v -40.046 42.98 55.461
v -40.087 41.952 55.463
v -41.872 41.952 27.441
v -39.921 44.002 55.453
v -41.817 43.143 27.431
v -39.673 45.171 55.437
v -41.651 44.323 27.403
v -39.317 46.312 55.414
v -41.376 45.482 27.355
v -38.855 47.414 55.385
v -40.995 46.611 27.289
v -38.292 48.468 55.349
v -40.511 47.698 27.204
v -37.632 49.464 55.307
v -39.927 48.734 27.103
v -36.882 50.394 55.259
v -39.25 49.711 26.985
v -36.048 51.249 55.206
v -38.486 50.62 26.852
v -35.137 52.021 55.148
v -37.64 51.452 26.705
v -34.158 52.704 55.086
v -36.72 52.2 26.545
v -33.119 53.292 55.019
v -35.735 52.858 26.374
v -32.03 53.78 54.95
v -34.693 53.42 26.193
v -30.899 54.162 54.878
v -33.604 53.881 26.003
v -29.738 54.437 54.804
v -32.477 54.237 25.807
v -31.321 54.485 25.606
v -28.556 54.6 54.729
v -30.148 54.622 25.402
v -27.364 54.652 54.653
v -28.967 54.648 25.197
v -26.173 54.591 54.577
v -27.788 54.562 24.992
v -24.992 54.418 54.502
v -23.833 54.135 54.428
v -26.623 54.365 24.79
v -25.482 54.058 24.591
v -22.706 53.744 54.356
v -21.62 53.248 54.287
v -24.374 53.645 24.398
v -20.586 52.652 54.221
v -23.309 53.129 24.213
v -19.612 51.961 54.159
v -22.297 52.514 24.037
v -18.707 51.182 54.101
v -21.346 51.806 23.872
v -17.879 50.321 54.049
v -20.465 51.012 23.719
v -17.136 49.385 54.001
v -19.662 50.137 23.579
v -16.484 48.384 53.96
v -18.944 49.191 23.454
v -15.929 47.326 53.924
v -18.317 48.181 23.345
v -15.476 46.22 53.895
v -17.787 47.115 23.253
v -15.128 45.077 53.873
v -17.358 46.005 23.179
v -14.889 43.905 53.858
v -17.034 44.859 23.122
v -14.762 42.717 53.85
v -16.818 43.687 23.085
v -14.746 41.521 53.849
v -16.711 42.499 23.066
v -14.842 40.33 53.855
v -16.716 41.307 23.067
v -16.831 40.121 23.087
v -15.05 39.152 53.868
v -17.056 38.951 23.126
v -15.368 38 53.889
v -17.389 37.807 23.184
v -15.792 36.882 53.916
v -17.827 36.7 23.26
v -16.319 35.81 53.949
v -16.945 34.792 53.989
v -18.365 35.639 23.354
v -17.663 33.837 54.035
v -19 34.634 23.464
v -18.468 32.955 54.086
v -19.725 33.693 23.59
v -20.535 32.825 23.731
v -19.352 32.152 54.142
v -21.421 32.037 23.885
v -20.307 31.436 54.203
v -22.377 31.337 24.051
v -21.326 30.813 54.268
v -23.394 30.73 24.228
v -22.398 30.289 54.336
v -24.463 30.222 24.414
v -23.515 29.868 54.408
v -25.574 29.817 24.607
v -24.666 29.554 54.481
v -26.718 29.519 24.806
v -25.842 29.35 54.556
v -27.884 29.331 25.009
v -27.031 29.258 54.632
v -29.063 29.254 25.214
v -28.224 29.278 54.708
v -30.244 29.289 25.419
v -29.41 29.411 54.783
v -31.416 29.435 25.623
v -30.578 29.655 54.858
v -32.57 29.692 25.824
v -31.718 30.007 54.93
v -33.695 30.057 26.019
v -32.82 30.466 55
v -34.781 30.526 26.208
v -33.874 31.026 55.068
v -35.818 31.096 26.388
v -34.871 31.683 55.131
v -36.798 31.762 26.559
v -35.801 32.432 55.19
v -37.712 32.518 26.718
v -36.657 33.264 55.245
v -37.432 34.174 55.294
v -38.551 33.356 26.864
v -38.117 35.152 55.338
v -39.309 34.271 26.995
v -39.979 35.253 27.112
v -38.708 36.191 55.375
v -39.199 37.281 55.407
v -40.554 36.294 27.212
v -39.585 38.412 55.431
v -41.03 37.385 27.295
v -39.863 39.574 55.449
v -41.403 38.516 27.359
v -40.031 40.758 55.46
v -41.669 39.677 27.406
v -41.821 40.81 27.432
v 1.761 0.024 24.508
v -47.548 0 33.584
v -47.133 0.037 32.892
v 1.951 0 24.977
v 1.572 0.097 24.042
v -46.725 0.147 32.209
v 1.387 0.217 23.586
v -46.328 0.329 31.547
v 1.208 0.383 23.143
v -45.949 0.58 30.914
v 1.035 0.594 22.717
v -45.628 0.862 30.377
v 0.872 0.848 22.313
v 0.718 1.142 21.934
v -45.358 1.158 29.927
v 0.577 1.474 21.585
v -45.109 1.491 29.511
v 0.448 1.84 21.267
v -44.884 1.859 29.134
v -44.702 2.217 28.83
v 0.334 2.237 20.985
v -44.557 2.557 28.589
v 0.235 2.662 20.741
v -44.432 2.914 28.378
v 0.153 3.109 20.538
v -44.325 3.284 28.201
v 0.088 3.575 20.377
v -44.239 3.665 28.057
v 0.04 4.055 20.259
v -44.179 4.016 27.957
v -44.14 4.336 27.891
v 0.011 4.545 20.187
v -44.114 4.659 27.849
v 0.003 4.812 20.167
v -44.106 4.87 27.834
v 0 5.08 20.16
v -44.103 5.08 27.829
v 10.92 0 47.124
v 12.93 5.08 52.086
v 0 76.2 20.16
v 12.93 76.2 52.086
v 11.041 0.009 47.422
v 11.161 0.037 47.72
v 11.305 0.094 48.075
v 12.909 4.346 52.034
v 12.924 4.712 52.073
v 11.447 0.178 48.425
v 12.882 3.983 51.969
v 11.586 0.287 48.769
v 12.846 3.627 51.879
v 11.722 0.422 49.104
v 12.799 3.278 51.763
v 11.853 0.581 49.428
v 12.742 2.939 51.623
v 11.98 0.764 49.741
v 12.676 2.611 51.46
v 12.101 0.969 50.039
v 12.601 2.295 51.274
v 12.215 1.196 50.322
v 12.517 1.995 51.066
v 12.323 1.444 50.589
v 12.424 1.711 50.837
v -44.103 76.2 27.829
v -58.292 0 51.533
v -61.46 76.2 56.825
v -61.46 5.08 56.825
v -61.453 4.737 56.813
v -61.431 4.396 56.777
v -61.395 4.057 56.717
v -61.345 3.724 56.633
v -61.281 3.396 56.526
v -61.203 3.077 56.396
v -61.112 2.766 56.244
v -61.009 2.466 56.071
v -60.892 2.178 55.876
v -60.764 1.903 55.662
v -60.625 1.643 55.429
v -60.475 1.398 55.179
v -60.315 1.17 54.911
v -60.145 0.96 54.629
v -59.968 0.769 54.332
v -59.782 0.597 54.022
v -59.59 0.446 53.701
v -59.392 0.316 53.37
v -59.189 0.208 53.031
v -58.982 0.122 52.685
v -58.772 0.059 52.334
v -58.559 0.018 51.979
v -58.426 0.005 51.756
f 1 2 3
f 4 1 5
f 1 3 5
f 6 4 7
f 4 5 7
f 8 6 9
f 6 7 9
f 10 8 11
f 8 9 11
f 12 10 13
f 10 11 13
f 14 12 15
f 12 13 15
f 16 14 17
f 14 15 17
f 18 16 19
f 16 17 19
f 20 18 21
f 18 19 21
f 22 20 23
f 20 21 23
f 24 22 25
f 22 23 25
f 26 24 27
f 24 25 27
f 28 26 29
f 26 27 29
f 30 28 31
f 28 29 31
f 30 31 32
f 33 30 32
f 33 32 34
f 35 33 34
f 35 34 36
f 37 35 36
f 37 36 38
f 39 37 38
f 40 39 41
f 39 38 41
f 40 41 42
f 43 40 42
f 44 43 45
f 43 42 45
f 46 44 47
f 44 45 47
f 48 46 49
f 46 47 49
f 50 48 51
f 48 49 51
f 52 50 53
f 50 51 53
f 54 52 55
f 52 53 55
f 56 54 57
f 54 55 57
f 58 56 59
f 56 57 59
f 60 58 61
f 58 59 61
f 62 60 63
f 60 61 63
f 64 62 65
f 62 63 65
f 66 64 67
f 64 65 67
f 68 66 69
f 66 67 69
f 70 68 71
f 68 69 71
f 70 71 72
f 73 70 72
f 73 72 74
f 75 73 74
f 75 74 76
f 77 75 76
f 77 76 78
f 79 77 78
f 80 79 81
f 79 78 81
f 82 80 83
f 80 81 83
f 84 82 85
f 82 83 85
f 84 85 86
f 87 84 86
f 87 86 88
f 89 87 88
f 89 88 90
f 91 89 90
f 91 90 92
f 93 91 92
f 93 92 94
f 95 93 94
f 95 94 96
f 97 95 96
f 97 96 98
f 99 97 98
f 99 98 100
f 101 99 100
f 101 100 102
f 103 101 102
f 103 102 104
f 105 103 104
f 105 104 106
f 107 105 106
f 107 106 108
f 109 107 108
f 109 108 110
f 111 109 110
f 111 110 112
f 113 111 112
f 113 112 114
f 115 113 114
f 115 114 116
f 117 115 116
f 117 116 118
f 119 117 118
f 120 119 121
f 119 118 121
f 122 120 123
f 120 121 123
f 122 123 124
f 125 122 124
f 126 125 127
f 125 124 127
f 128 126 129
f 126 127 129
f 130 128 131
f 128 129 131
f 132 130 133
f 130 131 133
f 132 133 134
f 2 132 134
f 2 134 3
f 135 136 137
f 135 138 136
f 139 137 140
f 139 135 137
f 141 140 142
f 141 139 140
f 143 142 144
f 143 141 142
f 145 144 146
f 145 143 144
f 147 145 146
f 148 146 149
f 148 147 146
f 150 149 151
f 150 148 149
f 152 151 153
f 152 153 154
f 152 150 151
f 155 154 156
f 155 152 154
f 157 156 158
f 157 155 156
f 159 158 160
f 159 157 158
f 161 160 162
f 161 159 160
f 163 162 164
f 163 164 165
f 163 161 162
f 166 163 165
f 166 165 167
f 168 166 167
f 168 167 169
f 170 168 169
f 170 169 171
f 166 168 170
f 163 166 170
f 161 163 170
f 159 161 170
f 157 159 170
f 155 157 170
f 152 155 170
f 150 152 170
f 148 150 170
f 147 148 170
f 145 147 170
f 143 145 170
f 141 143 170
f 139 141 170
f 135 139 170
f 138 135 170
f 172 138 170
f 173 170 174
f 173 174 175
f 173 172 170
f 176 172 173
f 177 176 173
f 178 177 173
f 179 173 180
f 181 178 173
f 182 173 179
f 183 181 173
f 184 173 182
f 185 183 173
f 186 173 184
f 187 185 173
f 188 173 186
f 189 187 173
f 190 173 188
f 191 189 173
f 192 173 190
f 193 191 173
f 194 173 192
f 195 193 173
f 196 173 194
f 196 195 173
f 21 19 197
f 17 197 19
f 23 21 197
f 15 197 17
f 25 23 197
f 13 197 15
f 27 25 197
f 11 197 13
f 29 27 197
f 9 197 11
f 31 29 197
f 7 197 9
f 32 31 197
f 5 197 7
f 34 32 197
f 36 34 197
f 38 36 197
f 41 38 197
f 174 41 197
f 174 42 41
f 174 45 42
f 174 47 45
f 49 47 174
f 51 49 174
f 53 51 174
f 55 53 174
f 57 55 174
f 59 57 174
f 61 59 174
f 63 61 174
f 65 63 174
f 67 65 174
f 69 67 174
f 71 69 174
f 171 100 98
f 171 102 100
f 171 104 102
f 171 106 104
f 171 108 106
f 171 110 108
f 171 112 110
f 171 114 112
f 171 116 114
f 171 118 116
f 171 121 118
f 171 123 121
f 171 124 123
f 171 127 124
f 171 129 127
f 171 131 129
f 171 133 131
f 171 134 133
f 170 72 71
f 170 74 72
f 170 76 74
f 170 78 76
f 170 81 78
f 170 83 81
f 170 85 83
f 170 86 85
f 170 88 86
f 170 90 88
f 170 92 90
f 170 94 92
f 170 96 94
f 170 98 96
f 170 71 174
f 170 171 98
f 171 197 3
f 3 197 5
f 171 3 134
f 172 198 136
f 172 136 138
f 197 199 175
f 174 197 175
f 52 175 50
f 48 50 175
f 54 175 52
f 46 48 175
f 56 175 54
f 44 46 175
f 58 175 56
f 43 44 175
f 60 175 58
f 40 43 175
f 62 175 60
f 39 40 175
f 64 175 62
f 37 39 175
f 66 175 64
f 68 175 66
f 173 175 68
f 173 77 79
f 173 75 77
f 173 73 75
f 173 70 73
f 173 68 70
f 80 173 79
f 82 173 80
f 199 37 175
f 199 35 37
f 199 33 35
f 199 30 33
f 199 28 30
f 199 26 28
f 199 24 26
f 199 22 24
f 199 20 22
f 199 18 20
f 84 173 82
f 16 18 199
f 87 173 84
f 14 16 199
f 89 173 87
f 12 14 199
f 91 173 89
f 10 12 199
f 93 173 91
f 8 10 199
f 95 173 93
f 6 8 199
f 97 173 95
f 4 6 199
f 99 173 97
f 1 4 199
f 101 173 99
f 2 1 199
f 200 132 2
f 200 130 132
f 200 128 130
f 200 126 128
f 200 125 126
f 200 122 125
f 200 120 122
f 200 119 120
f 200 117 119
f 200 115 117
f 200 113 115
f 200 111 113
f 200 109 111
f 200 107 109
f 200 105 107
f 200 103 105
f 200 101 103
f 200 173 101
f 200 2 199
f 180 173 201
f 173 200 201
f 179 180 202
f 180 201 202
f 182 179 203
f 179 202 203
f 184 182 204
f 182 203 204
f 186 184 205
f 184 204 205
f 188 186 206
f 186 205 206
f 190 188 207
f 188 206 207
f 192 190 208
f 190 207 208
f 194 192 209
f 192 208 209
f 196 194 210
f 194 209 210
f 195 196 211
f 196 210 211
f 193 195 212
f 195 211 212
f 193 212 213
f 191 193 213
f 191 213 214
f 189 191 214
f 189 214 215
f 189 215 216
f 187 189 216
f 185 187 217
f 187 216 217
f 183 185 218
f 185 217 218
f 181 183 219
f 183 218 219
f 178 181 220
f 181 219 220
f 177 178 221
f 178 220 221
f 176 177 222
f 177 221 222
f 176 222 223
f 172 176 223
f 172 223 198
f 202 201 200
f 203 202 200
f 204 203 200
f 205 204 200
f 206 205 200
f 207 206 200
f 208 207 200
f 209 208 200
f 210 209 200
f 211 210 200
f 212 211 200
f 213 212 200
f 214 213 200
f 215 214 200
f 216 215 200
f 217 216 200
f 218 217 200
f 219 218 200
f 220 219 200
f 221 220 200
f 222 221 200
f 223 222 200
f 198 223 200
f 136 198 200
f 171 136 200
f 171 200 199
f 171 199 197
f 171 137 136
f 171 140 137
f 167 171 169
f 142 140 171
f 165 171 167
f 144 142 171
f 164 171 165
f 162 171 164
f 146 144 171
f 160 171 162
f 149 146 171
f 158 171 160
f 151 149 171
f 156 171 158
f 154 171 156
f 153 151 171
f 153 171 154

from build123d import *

# Parameters (mm, degrees)
F1_DEPTH = 76.2
F2_R     = 5.08
F3_R     = 5.08
F5_D     = 25.4


with BuildPart() as f1:
    # F0 (on Front) → F1 (new body)
    with BuildSketch(Plane.XZ):
        Polygon((12.929662, 52.085873), (-61.460182, 56.824941), (-44.102553, 27.828874), (0, 20.160461), align=None)
    extrude(amount=-F1_DEPTH)

    # F2
    f2_edges = [f1.edges().sort_by_distance(p)[0] for p in [
        (-24.26526, 0, 54.455407),
    ]]
    fillet(f2_edges, radius=F2_R)

    # F3
    f3_edges = [f1.edges().sort_by_distance(p)[0] for p in [
        (-22.051277, 0, 23.994667),
    ]]
    fillet(f3_edges, radius=F3_R)

    # F5 (through all)
    with Locations(Plane(origin=(3.357025, 0, 52.695706), x_dir=(0.997977, 0, -0.063577), z_dir=(0.063577, 0, 0.997977))):
        with Locations((-30.832324, 41.9522)):
            Hole(F5_D / 2)


solid = f1.part
